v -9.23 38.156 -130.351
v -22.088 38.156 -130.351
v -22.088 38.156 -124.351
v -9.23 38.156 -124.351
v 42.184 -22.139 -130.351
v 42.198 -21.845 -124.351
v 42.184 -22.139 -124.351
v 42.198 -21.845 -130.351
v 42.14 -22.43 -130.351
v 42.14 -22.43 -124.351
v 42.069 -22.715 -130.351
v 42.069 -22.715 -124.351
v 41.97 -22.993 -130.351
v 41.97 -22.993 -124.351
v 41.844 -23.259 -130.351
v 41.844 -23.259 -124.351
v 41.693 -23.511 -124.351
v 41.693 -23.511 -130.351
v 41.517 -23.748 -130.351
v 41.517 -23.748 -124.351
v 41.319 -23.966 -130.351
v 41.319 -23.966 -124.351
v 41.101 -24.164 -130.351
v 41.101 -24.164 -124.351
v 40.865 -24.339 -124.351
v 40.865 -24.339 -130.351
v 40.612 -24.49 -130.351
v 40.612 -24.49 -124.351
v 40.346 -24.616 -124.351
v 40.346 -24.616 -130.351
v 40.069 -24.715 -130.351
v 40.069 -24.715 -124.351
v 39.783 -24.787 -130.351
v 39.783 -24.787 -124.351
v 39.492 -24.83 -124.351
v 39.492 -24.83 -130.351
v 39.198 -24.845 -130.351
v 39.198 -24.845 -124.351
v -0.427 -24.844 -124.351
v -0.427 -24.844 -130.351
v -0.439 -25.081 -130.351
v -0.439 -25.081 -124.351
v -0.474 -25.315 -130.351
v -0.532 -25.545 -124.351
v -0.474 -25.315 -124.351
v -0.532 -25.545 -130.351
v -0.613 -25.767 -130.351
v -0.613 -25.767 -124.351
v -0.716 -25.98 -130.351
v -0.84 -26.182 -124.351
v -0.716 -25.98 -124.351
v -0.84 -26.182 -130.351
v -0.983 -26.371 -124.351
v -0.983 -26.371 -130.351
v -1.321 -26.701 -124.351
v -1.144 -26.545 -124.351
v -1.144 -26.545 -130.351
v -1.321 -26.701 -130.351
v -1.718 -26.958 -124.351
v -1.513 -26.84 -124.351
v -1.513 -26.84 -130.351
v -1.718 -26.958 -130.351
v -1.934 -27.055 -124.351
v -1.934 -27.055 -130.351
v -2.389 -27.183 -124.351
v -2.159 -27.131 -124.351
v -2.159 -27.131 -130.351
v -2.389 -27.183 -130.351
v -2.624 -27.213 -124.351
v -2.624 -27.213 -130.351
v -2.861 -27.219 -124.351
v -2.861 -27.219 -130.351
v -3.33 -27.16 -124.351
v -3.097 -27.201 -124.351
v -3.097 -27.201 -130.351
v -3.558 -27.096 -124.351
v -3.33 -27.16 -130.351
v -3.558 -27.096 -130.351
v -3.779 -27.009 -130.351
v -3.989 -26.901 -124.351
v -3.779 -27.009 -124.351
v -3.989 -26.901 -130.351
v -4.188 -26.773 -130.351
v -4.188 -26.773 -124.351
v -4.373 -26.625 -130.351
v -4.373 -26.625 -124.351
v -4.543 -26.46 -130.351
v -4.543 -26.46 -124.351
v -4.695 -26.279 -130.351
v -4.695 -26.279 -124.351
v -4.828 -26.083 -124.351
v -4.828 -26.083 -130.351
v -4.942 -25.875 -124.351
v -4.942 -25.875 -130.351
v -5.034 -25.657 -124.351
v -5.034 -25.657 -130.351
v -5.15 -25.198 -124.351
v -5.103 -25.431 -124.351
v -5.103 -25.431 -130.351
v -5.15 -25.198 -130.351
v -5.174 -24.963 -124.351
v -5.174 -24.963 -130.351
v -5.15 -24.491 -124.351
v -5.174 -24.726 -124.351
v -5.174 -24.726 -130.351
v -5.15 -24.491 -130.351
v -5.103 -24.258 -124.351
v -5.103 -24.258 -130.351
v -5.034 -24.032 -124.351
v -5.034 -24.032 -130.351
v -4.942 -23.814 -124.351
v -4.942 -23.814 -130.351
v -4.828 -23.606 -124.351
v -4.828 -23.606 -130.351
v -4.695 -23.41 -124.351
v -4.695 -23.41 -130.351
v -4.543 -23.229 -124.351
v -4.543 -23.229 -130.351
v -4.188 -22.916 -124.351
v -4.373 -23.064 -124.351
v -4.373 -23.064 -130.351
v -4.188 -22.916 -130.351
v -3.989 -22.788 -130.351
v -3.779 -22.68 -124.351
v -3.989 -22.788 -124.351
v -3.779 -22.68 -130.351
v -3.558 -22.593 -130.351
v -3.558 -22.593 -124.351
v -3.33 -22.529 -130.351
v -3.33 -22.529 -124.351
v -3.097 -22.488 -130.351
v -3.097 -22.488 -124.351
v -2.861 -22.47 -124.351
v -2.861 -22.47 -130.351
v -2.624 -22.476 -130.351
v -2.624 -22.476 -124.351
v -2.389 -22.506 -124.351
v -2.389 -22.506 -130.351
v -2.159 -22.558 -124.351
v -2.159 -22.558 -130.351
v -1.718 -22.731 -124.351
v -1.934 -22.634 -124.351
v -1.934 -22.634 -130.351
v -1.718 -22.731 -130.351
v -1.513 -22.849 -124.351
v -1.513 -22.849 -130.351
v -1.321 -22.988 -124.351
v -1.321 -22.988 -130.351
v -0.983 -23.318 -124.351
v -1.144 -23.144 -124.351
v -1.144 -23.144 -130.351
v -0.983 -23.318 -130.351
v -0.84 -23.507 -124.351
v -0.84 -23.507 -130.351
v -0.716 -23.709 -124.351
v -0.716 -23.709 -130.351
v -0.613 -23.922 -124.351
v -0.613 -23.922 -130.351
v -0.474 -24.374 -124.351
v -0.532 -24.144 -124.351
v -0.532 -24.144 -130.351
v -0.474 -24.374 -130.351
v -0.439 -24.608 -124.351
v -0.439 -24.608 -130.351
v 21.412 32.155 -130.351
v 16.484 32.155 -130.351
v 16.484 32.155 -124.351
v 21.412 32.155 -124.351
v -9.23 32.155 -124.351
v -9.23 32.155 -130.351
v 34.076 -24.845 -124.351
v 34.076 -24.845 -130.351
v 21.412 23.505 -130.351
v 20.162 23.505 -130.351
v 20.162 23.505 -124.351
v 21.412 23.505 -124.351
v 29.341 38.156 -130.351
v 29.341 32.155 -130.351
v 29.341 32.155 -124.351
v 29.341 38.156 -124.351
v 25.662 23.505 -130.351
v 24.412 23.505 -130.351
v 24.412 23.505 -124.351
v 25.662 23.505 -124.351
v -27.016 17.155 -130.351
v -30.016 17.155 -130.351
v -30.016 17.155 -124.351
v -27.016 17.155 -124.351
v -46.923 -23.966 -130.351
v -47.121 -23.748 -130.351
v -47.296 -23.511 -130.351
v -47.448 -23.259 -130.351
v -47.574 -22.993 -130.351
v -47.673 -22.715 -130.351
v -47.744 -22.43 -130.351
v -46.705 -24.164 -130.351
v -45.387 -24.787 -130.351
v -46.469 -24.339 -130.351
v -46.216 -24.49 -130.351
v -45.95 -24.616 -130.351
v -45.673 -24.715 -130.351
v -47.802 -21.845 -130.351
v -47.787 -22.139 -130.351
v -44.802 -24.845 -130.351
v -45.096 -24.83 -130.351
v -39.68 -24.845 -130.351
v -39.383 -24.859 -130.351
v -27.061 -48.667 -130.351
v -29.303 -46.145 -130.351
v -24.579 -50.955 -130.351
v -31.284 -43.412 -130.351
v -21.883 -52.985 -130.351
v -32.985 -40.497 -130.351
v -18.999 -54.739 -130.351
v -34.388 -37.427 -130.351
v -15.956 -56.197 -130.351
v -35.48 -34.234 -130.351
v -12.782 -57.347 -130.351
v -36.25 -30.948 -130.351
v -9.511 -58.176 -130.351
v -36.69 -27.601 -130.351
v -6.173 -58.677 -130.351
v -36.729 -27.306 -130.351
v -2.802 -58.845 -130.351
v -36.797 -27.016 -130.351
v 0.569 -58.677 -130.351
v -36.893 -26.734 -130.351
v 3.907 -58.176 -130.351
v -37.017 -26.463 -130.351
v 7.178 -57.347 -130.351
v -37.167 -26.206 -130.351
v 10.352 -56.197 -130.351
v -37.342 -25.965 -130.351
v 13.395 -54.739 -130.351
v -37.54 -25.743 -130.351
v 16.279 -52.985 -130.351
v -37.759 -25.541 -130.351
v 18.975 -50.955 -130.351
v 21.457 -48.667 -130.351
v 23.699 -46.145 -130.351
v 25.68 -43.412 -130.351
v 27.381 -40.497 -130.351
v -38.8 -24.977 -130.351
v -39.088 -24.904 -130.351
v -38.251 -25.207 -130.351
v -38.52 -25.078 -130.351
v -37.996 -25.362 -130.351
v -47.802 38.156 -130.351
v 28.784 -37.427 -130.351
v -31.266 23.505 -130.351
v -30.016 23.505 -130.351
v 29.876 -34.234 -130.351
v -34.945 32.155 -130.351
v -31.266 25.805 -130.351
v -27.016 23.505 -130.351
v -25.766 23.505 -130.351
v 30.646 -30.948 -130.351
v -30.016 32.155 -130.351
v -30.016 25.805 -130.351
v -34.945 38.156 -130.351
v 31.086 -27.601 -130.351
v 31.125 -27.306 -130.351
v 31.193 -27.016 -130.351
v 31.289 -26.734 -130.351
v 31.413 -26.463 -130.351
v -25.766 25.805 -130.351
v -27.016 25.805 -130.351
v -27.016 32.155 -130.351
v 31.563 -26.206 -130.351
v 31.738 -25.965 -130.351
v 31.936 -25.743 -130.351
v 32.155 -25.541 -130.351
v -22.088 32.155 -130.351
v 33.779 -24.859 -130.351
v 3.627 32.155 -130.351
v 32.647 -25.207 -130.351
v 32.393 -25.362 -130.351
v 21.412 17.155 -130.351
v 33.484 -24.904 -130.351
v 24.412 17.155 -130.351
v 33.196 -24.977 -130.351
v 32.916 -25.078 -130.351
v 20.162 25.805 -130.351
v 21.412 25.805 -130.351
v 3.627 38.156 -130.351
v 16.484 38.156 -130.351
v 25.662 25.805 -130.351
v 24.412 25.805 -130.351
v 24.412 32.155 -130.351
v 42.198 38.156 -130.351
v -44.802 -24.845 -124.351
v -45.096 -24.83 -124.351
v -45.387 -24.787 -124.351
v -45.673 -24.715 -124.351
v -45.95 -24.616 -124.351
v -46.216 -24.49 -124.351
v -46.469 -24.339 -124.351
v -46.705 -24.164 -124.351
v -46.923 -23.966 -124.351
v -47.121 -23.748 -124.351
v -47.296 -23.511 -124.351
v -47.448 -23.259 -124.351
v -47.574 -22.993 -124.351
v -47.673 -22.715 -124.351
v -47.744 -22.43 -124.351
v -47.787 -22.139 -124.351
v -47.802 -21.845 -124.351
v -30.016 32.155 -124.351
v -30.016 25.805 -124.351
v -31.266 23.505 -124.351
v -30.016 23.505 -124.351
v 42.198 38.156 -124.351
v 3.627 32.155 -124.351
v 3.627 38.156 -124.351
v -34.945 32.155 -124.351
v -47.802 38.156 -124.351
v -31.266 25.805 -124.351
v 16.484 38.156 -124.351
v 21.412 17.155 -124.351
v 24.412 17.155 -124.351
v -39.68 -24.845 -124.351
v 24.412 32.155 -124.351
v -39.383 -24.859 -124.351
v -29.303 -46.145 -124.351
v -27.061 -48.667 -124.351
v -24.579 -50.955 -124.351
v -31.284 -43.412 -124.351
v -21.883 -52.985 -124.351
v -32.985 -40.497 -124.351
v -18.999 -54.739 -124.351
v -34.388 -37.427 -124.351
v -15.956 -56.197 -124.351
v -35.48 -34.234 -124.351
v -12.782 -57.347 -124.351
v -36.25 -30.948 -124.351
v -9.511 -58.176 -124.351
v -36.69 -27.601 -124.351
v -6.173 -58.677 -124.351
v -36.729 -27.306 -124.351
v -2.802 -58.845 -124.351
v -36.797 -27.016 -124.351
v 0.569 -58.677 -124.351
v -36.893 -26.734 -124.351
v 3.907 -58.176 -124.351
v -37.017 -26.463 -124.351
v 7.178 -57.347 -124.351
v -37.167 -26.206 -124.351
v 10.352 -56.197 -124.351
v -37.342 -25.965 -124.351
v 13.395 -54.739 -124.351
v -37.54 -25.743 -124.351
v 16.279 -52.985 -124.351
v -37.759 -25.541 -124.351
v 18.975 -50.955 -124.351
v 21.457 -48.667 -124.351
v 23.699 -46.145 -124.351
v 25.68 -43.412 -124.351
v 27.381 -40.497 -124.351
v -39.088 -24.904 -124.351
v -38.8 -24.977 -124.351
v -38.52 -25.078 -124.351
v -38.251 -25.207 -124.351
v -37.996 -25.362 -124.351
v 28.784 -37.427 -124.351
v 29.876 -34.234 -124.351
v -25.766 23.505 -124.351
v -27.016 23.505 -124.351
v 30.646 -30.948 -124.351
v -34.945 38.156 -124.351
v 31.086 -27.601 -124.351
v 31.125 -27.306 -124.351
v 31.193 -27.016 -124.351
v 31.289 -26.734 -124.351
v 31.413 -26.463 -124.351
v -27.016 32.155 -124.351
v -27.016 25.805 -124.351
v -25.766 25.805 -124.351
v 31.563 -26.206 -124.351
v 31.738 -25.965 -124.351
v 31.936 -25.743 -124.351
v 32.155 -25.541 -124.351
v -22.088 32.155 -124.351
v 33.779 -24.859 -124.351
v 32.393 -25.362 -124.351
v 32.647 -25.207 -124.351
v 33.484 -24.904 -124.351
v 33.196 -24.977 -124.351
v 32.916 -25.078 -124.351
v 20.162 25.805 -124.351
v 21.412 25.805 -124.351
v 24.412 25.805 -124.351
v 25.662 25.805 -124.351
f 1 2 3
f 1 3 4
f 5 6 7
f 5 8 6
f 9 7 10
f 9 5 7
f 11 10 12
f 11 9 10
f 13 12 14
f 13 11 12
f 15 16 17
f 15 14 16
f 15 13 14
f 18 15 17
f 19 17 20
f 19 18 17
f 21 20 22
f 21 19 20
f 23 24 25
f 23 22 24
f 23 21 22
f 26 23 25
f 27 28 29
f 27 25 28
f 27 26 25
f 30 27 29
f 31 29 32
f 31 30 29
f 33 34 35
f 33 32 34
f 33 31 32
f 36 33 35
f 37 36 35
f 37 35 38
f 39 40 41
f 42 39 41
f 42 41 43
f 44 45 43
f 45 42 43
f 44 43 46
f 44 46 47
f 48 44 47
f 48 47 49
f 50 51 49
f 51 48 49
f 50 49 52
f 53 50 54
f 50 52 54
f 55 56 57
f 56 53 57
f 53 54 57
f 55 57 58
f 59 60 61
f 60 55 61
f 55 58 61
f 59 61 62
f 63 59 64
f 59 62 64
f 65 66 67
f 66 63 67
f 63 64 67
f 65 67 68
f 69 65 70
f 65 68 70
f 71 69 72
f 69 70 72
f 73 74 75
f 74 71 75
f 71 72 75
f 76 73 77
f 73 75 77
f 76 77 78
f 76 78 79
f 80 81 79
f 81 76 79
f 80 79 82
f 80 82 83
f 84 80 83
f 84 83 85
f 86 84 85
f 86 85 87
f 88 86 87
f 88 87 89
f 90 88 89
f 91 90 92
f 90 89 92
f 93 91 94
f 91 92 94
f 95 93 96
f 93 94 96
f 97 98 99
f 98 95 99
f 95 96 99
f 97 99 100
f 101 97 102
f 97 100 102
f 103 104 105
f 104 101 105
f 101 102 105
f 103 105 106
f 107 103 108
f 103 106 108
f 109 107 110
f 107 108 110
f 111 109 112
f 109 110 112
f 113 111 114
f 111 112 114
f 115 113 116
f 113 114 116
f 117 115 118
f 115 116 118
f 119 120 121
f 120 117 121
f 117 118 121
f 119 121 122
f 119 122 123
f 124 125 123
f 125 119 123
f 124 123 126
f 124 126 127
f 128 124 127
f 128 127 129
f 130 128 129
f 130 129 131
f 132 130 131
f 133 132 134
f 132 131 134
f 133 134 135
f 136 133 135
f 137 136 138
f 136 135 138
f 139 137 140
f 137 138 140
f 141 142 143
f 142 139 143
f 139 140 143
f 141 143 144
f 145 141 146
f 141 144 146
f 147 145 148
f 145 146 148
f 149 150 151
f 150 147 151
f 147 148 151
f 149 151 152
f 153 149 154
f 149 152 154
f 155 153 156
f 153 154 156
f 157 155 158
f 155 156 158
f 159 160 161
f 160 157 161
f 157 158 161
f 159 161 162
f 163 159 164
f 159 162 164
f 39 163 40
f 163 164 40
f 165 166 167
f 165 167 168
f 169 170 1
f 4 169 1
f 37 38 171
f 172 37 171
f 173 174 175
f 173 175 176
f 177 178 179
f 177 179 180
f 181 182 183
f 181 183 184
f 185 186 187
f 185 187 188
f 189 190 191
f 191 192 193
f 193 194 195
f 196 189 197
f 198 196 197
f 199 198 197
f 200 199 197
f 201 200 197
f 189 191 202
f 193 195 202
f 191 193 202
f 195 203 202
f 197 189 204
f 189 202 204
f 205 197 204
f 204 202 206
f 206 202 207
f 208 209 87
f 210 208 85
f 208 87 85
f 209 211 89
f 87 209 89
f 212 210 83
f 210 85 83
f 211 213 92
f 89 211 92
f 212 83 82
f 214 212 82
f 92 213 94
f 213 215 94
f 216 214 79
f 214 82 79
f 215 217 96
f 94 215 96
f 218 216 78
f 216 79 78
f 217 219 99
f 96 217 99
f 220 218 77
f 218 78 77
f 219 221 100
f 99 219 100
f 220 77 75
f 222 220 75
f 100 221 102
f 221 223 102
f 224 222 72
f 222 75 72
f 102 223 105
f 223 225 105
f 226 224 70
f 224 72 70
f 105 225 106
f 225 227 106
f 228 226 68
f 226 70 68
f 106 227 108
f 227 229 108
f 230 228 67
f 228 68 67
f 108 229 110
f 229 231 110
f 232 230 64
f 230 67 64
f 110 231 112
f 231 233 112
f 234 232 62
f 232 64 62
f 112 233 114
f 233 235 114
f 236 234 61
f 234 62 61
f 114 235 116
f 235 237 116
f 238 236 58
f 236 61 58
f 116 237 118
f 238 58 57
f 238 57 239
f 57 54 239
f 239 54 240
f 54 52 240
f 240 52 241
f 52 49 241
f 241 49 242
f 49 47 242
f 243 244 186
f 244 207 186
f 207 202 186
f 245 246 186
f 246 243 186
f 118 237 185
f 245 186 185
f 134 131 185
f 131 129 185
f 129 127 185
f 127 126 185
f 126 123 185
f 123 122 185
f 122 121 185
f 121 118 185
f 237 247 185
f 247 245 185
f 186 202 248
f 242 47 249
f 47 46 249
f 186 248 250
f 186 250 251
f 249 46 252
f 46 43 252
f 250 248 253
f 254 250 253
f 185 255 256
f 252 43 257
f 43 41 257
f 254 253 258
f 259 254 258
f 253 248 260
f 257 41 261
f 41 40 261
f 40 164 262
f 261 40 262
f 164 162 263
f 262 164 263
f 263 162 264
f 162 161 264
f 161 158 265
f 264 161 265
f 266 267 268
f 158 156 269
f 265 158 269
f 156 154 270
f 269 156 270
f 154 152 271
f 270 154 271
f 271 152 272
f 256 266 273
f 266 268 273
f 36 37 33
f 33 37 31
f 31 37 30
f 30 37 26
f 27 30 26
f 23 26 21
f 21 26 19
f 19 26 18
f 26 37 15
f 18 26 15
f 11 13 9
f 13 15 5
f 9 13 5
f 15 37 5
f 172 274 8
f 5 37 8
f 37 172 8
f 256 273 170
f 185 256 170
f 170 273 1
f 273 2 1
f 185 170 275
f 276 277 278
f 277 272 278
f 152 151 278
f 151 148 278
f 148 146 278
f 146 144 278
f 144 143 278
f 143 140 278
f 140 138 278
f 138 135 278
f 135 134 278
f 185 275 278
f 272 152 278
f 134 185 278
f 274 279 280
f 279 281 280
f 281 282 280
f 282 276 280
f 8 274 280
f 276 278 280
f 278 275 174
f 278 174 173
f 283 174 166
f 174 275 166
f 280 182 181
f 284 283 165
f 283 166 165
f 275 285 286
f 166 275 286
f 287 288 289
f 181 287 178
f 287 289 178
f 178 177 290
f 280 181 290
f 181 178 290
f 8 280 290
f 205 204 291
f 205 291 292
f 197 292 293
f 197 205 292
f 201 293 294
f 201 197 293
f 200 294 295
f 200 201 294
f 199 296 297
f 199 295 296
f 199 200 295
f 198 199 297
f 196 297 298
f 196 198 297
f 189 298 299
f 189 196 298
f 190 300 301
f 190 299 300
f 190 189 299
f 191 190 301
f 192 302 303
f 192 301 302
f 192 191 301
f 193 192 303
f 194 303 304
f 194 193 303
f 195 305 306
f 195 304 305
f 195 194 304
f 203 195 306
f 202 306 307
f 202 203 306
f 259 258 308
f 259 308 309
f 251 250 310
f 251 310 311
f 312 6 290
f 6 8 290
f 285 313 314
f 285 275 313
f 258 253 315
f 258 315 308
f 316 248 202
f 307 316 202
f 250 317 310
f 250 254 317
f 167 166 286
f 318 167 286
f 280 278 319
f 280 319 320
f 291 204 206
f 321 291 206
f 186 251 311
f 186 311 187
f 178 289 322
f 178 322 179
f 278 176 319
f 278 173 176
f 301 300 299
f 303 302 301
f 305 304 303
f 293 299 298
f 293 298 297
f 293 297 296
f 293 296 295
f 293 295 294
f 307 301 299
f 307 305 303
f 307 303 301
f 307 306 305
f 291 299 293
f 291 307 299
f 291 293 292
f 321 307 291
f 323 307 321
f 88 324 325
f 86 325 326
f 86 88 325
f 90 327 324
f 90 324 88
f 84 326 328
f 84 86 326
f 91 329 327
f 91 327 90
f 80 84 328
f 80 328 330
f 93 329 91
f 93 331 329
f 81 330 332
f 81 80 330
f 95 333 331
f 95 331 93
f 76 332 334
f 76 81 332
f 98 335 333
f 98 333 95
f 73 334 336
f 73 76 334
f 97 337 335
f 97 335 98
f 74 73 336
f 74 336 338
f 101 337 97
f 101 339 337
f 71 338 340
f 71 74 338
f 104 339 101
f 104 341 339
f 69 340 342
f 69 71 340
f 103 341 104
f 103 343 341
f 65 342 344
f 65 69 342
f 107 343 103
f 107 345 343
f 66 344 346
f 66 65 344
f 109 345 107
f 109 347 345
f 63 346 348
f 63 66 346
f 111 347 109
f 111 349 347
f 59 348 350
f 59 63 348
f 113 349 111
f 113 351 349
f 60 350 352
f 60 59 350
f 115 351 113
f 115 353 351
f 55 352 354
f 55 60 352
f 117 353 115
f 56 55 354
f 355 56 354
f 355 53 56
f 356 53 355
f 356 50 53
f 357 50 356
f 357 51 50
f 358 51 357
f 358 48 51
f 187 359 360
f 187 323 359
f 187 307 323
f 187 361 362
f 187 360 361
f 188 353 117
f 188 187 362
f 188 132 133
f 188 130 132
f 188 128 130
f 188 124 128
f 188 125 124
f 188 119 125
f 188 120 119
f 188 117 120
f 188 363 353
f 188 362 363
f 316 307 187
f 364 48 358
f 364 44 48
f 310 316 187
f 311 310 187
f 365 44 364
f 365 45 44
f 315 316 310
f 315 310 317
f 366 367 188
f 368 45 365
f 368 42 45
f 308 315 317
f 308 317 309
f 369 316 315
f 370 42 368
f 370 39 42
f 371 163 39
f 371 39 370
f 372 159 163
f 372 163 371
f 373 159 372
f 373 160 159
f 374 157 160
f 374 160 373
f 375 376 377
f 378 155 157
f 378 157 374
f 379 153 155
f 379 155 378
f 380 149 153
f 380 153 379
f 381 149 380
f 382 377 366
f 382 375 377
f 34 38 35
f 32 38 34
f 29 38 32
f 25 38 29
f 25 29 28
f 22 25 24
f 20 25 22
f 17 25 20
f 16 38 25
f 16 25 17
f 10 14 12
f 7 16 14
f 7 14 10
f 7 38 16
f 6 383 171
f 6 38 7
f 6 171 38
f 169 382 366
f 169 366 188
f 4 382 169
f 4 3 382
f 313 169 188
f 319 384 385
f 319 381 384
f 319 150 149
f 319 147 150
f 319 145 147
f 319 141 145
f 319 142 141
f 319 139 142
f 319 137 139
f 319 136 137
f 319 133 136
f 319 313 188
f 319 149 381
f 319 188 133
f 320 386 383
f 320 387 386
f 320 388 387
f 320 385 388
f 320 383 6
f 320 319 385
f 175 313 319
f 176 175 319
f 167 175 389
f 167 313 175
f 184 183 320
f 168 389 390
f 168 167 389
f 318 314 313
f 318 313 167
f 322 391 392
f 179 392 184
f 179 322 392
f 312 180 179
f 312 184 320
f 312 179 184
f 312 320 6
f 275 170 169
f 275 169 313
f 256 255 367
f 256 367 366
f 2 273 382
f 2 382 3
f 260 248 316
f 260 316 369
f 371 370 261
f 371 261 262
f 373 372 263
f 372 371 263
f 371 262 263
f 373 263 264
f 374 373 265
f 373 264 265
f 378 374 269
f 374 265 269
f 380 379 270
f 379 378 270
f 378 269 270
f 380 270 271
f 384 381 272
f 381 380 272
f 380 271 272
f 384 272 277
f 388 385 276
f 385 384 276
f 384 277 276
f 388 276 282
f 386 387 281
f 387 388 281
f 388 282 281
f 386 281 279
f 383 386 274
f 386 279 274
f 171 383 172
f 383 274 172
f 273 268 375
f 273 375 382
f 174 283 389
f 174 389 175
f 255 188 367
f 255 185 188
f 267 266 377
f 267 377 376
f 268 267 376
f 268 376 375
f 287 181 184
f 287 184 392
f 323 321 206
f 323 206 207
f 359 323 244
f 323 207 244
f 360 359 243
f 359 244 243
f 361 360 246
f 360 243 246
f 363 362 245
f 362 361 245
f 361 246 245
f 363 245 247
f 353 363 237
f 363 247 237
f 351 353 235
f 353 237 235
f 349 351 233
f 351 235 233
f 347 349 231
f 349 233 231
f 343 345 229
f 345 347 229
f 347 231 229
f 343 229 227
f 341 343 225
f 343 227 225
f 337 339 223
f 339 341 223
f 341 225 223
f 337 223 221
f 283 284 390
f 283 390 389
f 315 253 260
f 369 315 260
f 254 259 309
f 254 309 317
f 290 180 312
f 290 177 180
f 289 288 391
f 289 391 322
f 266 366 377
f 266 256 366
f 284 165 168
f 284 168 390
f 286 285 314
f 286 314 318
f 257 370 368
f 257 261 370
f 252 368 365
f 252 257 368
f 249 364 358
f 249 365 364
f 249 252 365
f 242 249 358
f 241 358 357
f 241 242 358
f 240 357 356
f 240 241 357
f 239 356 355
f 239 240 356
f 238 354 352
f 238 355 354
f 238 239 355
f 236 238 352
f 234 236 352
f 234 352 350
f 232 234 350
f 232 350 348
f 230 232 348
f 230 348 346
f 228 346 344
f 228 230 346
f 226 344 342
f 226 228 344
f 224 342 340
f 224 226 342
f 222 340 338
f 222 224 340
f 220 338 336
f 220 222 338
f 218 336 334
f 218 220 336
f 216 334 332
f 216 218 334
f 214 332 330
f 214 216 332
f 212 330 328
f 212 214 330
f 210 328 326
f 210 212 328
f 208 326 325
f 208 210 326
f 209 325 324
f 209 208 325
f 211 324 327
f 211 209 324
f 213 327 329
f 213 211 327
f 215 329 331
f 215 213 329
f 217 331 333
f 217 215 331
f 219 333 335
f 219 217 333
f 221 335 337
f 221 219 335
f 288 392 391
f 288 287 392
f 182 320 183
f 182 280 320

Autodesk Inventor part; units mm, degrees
ref_plane "YZ Plane" through (0, 0, 0) normal (1, 0, 0) x (0, 1, 0)
ref_plane "XZ Plane" through (0, 0, 0) normal (0, 1, 0) x (-1, 0, 0)
ref_plane "XY Plane" through (0, 0, 0) normal (0, 0, 1) x (1, 0, 0)
ref_plane "РабПлоскость1" through (-34.9448, 28.465, -130.3508) normal (0, 0, 1) x (1, 0, 0)
ref_plane "РабПлоскость2" through (-162.802, 331.465, 111.3492) normal (0, 0, 1) x (1, 0, 0)
sketch "Эскиз1" plane through (-34.9448, 28.465, -130.3508) normal (0, 0, 1) x (1, 0, 0)
  line L0 (0, 3.6904) -> (-12.8571, 3.6904) construction
  line L1 (0, 3.6904) -> (0, 9.6905) projected
  line L2 (-12.8571, 9.6905) -> (0, 9.6905) projected
  line L3 (-12.8571, 3.6904) -> (-12.8571, 9.6905) projected
  line L4 (25.7143, 3.6904) -> (12.8571, 3.6904) construction
  line L5 (25.7143, 3.6904) -> (25.7143, 9.6905) projected
  line L6 (12.8571, 9.6905) -> (25.7143, 9.6905) projected
  line L7 (12.8571, 3.6904) -> (12.8571, 9.6905) projected
  line L8 (51.4286, 3.6904) -> (38.5714, 3.6904) construction
  line L9 (51.4286, 3.6904) -> (51.4286, 9.6905) projected
  line L10 (38.5714, 9.6905) -> (51.4286, 9.6905) projected
  line L11 (38.5714, 3.6904) -> (38.5714, 9.6905) projected
  line L12 (77.1429, 3.6904) -> (64.2857, 3.6904) construction
  line L13 (77.1429, 3.6904) -> (77.1429, 9.6905) projected
  line L14 (64.2857, 9.6905) -> (77.1429, 9.6905) projected
  line L15 (64.2857, 3.6904) -> (64.2857, 9.6905) projected
  line L16 (0, 3.6904) -> (12.8571, 3.6904)
  line L17 (25.7143, 3.6904) -> (38.5714, 3.6904)
  line L18 (51.4286, 3.6904) -> (64.2857, 3.6904)
  line L19 (-12.8571, 3.6904) -> (-12.8571, -50.3096)
  line L20 (-9.8571, -53.3096) -> (-4.7353, -53.3096)
  line L21 (77.1429, 3.6904) -> (77.1429, -50.3096)
  line L22 (74.1429, -53.3096) -> (69.021, -53.3096)
  line L23 (-1.8571, -53.3096) -> (66.1429, -53.3096) construction
  arc A0 (-1.7452, -56.0663) -> (66.0309, -56.0663) centre (32.1429, -53.3096) ccw
  arc A1 (-1.7452, -56.0663) -> (-4.7353, -53.3096) centre (-4.7353, -56.3096) ccw
  arc A2 (69.021, -53.3096) -> (66.0309, -56.0663) centre (69.021, -56.3096) ccw
  arc A3 (74.1429, -53.3096) -> (77.1429, -50.3096) centre (74.1429, -50.3096) ccw
  arc A4 (-12.8571, -50.3096) -> (-9.8571, -53.3096) centre (-9.8571, -50.3096) ccw
  circle A5 centre (32.1429, -53.3095) radius 2.375
  point P0 (34.9448, -28.465)
  point P1 (77.1429, -53.3096)
  dimension "d0" = 57
  dimension "d1" = 34
  dimension "d2" = 3
  dimension "d3" = 6
  dimension "d14" = 4.75
extrude "Выдавливание1" add sketch "Эскиз1" along normal blind 6
sketch "Эскиз2" plane through (-34.9448, 28.465, -130.3508) normal (0, 0, -1) x (-1, 0, 0)
  line L0 (-4.9286, 3.6904) -> (-4.9286, -2.6596)
  line L1 (-4.9286, -2.6596) -> (-3.6786, -2.6596)
  line L2 (-3.6786, -2.6596) -> (-3.6786, -4.9596)
  line L3 (-3.6786, -4.9596) -> (-4.9286, -4.9596)
  line L4 (-4.9286, -4.9596) -> (-4.9286, -11.3096)
  line L5 (-4.9286, -11.3096) -> (-7.9286, -11.3096)
  line L6 (-7.9286, -11.3096) -> (-7.9286, -4.9596)
  line L7 (-7.9286, -4.9596) -> (-9.1786, -4.9596)
  line L8 (-9.1786, -4.9596) -> (-9.1786, -2.6596)
  line L9 (-9.1786, -2.6596) -> (-7.9286, -2.6596)
  line L10 (-7.9286, -2.6596) -> (-7.9286, 3.6904)
  line L11 (-56.3571, 3.6904) -> (-59.3571, 3.6904)
  line L12 (-56.3571, 3.6904) -> (-56.3571, -2.6596)
  line L13 (-56.3571, -2.6596) -> (-55.1071, -2.6596)
  line L14 (-55.1071, -2.6596) -> (-55.1071, -4.9596)
  line L15 (-55.1071, -4.9596) -> (-56.3571, -4.9596)
  line L16 (-56.3571, -4.9596) -> (-56.3571, -11.3096)
  line L17 (-56.3571, -11.3096) -> (-59.3571, -11.3096)
  line L18 (-59.3571, -11.3096) -> (-59.3571, -4.9596)
  line L19 (-59.3571, -4.9596) -> (-60.6071, -4.9596)
  line L20 (-60.6071, -4.9596) -> (-60.6071, -2.6596)
  line L21 (-60.6071, -2.6596) -> (-59.3571, -2.6596)
  line L22 (-59.3571, -2.6596) -> (-59.3571, 3.6904)
  line L23 (-56.3571, 3.6904) -> (-59.3571, 3.6904) projected
  line L24 (-4.9286, 3.6904) -> (-7.9286, 3.6904) projected
  point P0 (-34.9448, -28.465)
  point P1 (-6.4286, 0)
  dimension "d9" = 5.5
  dimension "d10" = 2.3
  dimension "d11" = 15
extrude "Выдавливание2" cut sketch "Эскиз2" against normal blind 6
equation "\"d4\" = d3"
equation "\"d12\" = d3"
properties part number "Korpus 4"
